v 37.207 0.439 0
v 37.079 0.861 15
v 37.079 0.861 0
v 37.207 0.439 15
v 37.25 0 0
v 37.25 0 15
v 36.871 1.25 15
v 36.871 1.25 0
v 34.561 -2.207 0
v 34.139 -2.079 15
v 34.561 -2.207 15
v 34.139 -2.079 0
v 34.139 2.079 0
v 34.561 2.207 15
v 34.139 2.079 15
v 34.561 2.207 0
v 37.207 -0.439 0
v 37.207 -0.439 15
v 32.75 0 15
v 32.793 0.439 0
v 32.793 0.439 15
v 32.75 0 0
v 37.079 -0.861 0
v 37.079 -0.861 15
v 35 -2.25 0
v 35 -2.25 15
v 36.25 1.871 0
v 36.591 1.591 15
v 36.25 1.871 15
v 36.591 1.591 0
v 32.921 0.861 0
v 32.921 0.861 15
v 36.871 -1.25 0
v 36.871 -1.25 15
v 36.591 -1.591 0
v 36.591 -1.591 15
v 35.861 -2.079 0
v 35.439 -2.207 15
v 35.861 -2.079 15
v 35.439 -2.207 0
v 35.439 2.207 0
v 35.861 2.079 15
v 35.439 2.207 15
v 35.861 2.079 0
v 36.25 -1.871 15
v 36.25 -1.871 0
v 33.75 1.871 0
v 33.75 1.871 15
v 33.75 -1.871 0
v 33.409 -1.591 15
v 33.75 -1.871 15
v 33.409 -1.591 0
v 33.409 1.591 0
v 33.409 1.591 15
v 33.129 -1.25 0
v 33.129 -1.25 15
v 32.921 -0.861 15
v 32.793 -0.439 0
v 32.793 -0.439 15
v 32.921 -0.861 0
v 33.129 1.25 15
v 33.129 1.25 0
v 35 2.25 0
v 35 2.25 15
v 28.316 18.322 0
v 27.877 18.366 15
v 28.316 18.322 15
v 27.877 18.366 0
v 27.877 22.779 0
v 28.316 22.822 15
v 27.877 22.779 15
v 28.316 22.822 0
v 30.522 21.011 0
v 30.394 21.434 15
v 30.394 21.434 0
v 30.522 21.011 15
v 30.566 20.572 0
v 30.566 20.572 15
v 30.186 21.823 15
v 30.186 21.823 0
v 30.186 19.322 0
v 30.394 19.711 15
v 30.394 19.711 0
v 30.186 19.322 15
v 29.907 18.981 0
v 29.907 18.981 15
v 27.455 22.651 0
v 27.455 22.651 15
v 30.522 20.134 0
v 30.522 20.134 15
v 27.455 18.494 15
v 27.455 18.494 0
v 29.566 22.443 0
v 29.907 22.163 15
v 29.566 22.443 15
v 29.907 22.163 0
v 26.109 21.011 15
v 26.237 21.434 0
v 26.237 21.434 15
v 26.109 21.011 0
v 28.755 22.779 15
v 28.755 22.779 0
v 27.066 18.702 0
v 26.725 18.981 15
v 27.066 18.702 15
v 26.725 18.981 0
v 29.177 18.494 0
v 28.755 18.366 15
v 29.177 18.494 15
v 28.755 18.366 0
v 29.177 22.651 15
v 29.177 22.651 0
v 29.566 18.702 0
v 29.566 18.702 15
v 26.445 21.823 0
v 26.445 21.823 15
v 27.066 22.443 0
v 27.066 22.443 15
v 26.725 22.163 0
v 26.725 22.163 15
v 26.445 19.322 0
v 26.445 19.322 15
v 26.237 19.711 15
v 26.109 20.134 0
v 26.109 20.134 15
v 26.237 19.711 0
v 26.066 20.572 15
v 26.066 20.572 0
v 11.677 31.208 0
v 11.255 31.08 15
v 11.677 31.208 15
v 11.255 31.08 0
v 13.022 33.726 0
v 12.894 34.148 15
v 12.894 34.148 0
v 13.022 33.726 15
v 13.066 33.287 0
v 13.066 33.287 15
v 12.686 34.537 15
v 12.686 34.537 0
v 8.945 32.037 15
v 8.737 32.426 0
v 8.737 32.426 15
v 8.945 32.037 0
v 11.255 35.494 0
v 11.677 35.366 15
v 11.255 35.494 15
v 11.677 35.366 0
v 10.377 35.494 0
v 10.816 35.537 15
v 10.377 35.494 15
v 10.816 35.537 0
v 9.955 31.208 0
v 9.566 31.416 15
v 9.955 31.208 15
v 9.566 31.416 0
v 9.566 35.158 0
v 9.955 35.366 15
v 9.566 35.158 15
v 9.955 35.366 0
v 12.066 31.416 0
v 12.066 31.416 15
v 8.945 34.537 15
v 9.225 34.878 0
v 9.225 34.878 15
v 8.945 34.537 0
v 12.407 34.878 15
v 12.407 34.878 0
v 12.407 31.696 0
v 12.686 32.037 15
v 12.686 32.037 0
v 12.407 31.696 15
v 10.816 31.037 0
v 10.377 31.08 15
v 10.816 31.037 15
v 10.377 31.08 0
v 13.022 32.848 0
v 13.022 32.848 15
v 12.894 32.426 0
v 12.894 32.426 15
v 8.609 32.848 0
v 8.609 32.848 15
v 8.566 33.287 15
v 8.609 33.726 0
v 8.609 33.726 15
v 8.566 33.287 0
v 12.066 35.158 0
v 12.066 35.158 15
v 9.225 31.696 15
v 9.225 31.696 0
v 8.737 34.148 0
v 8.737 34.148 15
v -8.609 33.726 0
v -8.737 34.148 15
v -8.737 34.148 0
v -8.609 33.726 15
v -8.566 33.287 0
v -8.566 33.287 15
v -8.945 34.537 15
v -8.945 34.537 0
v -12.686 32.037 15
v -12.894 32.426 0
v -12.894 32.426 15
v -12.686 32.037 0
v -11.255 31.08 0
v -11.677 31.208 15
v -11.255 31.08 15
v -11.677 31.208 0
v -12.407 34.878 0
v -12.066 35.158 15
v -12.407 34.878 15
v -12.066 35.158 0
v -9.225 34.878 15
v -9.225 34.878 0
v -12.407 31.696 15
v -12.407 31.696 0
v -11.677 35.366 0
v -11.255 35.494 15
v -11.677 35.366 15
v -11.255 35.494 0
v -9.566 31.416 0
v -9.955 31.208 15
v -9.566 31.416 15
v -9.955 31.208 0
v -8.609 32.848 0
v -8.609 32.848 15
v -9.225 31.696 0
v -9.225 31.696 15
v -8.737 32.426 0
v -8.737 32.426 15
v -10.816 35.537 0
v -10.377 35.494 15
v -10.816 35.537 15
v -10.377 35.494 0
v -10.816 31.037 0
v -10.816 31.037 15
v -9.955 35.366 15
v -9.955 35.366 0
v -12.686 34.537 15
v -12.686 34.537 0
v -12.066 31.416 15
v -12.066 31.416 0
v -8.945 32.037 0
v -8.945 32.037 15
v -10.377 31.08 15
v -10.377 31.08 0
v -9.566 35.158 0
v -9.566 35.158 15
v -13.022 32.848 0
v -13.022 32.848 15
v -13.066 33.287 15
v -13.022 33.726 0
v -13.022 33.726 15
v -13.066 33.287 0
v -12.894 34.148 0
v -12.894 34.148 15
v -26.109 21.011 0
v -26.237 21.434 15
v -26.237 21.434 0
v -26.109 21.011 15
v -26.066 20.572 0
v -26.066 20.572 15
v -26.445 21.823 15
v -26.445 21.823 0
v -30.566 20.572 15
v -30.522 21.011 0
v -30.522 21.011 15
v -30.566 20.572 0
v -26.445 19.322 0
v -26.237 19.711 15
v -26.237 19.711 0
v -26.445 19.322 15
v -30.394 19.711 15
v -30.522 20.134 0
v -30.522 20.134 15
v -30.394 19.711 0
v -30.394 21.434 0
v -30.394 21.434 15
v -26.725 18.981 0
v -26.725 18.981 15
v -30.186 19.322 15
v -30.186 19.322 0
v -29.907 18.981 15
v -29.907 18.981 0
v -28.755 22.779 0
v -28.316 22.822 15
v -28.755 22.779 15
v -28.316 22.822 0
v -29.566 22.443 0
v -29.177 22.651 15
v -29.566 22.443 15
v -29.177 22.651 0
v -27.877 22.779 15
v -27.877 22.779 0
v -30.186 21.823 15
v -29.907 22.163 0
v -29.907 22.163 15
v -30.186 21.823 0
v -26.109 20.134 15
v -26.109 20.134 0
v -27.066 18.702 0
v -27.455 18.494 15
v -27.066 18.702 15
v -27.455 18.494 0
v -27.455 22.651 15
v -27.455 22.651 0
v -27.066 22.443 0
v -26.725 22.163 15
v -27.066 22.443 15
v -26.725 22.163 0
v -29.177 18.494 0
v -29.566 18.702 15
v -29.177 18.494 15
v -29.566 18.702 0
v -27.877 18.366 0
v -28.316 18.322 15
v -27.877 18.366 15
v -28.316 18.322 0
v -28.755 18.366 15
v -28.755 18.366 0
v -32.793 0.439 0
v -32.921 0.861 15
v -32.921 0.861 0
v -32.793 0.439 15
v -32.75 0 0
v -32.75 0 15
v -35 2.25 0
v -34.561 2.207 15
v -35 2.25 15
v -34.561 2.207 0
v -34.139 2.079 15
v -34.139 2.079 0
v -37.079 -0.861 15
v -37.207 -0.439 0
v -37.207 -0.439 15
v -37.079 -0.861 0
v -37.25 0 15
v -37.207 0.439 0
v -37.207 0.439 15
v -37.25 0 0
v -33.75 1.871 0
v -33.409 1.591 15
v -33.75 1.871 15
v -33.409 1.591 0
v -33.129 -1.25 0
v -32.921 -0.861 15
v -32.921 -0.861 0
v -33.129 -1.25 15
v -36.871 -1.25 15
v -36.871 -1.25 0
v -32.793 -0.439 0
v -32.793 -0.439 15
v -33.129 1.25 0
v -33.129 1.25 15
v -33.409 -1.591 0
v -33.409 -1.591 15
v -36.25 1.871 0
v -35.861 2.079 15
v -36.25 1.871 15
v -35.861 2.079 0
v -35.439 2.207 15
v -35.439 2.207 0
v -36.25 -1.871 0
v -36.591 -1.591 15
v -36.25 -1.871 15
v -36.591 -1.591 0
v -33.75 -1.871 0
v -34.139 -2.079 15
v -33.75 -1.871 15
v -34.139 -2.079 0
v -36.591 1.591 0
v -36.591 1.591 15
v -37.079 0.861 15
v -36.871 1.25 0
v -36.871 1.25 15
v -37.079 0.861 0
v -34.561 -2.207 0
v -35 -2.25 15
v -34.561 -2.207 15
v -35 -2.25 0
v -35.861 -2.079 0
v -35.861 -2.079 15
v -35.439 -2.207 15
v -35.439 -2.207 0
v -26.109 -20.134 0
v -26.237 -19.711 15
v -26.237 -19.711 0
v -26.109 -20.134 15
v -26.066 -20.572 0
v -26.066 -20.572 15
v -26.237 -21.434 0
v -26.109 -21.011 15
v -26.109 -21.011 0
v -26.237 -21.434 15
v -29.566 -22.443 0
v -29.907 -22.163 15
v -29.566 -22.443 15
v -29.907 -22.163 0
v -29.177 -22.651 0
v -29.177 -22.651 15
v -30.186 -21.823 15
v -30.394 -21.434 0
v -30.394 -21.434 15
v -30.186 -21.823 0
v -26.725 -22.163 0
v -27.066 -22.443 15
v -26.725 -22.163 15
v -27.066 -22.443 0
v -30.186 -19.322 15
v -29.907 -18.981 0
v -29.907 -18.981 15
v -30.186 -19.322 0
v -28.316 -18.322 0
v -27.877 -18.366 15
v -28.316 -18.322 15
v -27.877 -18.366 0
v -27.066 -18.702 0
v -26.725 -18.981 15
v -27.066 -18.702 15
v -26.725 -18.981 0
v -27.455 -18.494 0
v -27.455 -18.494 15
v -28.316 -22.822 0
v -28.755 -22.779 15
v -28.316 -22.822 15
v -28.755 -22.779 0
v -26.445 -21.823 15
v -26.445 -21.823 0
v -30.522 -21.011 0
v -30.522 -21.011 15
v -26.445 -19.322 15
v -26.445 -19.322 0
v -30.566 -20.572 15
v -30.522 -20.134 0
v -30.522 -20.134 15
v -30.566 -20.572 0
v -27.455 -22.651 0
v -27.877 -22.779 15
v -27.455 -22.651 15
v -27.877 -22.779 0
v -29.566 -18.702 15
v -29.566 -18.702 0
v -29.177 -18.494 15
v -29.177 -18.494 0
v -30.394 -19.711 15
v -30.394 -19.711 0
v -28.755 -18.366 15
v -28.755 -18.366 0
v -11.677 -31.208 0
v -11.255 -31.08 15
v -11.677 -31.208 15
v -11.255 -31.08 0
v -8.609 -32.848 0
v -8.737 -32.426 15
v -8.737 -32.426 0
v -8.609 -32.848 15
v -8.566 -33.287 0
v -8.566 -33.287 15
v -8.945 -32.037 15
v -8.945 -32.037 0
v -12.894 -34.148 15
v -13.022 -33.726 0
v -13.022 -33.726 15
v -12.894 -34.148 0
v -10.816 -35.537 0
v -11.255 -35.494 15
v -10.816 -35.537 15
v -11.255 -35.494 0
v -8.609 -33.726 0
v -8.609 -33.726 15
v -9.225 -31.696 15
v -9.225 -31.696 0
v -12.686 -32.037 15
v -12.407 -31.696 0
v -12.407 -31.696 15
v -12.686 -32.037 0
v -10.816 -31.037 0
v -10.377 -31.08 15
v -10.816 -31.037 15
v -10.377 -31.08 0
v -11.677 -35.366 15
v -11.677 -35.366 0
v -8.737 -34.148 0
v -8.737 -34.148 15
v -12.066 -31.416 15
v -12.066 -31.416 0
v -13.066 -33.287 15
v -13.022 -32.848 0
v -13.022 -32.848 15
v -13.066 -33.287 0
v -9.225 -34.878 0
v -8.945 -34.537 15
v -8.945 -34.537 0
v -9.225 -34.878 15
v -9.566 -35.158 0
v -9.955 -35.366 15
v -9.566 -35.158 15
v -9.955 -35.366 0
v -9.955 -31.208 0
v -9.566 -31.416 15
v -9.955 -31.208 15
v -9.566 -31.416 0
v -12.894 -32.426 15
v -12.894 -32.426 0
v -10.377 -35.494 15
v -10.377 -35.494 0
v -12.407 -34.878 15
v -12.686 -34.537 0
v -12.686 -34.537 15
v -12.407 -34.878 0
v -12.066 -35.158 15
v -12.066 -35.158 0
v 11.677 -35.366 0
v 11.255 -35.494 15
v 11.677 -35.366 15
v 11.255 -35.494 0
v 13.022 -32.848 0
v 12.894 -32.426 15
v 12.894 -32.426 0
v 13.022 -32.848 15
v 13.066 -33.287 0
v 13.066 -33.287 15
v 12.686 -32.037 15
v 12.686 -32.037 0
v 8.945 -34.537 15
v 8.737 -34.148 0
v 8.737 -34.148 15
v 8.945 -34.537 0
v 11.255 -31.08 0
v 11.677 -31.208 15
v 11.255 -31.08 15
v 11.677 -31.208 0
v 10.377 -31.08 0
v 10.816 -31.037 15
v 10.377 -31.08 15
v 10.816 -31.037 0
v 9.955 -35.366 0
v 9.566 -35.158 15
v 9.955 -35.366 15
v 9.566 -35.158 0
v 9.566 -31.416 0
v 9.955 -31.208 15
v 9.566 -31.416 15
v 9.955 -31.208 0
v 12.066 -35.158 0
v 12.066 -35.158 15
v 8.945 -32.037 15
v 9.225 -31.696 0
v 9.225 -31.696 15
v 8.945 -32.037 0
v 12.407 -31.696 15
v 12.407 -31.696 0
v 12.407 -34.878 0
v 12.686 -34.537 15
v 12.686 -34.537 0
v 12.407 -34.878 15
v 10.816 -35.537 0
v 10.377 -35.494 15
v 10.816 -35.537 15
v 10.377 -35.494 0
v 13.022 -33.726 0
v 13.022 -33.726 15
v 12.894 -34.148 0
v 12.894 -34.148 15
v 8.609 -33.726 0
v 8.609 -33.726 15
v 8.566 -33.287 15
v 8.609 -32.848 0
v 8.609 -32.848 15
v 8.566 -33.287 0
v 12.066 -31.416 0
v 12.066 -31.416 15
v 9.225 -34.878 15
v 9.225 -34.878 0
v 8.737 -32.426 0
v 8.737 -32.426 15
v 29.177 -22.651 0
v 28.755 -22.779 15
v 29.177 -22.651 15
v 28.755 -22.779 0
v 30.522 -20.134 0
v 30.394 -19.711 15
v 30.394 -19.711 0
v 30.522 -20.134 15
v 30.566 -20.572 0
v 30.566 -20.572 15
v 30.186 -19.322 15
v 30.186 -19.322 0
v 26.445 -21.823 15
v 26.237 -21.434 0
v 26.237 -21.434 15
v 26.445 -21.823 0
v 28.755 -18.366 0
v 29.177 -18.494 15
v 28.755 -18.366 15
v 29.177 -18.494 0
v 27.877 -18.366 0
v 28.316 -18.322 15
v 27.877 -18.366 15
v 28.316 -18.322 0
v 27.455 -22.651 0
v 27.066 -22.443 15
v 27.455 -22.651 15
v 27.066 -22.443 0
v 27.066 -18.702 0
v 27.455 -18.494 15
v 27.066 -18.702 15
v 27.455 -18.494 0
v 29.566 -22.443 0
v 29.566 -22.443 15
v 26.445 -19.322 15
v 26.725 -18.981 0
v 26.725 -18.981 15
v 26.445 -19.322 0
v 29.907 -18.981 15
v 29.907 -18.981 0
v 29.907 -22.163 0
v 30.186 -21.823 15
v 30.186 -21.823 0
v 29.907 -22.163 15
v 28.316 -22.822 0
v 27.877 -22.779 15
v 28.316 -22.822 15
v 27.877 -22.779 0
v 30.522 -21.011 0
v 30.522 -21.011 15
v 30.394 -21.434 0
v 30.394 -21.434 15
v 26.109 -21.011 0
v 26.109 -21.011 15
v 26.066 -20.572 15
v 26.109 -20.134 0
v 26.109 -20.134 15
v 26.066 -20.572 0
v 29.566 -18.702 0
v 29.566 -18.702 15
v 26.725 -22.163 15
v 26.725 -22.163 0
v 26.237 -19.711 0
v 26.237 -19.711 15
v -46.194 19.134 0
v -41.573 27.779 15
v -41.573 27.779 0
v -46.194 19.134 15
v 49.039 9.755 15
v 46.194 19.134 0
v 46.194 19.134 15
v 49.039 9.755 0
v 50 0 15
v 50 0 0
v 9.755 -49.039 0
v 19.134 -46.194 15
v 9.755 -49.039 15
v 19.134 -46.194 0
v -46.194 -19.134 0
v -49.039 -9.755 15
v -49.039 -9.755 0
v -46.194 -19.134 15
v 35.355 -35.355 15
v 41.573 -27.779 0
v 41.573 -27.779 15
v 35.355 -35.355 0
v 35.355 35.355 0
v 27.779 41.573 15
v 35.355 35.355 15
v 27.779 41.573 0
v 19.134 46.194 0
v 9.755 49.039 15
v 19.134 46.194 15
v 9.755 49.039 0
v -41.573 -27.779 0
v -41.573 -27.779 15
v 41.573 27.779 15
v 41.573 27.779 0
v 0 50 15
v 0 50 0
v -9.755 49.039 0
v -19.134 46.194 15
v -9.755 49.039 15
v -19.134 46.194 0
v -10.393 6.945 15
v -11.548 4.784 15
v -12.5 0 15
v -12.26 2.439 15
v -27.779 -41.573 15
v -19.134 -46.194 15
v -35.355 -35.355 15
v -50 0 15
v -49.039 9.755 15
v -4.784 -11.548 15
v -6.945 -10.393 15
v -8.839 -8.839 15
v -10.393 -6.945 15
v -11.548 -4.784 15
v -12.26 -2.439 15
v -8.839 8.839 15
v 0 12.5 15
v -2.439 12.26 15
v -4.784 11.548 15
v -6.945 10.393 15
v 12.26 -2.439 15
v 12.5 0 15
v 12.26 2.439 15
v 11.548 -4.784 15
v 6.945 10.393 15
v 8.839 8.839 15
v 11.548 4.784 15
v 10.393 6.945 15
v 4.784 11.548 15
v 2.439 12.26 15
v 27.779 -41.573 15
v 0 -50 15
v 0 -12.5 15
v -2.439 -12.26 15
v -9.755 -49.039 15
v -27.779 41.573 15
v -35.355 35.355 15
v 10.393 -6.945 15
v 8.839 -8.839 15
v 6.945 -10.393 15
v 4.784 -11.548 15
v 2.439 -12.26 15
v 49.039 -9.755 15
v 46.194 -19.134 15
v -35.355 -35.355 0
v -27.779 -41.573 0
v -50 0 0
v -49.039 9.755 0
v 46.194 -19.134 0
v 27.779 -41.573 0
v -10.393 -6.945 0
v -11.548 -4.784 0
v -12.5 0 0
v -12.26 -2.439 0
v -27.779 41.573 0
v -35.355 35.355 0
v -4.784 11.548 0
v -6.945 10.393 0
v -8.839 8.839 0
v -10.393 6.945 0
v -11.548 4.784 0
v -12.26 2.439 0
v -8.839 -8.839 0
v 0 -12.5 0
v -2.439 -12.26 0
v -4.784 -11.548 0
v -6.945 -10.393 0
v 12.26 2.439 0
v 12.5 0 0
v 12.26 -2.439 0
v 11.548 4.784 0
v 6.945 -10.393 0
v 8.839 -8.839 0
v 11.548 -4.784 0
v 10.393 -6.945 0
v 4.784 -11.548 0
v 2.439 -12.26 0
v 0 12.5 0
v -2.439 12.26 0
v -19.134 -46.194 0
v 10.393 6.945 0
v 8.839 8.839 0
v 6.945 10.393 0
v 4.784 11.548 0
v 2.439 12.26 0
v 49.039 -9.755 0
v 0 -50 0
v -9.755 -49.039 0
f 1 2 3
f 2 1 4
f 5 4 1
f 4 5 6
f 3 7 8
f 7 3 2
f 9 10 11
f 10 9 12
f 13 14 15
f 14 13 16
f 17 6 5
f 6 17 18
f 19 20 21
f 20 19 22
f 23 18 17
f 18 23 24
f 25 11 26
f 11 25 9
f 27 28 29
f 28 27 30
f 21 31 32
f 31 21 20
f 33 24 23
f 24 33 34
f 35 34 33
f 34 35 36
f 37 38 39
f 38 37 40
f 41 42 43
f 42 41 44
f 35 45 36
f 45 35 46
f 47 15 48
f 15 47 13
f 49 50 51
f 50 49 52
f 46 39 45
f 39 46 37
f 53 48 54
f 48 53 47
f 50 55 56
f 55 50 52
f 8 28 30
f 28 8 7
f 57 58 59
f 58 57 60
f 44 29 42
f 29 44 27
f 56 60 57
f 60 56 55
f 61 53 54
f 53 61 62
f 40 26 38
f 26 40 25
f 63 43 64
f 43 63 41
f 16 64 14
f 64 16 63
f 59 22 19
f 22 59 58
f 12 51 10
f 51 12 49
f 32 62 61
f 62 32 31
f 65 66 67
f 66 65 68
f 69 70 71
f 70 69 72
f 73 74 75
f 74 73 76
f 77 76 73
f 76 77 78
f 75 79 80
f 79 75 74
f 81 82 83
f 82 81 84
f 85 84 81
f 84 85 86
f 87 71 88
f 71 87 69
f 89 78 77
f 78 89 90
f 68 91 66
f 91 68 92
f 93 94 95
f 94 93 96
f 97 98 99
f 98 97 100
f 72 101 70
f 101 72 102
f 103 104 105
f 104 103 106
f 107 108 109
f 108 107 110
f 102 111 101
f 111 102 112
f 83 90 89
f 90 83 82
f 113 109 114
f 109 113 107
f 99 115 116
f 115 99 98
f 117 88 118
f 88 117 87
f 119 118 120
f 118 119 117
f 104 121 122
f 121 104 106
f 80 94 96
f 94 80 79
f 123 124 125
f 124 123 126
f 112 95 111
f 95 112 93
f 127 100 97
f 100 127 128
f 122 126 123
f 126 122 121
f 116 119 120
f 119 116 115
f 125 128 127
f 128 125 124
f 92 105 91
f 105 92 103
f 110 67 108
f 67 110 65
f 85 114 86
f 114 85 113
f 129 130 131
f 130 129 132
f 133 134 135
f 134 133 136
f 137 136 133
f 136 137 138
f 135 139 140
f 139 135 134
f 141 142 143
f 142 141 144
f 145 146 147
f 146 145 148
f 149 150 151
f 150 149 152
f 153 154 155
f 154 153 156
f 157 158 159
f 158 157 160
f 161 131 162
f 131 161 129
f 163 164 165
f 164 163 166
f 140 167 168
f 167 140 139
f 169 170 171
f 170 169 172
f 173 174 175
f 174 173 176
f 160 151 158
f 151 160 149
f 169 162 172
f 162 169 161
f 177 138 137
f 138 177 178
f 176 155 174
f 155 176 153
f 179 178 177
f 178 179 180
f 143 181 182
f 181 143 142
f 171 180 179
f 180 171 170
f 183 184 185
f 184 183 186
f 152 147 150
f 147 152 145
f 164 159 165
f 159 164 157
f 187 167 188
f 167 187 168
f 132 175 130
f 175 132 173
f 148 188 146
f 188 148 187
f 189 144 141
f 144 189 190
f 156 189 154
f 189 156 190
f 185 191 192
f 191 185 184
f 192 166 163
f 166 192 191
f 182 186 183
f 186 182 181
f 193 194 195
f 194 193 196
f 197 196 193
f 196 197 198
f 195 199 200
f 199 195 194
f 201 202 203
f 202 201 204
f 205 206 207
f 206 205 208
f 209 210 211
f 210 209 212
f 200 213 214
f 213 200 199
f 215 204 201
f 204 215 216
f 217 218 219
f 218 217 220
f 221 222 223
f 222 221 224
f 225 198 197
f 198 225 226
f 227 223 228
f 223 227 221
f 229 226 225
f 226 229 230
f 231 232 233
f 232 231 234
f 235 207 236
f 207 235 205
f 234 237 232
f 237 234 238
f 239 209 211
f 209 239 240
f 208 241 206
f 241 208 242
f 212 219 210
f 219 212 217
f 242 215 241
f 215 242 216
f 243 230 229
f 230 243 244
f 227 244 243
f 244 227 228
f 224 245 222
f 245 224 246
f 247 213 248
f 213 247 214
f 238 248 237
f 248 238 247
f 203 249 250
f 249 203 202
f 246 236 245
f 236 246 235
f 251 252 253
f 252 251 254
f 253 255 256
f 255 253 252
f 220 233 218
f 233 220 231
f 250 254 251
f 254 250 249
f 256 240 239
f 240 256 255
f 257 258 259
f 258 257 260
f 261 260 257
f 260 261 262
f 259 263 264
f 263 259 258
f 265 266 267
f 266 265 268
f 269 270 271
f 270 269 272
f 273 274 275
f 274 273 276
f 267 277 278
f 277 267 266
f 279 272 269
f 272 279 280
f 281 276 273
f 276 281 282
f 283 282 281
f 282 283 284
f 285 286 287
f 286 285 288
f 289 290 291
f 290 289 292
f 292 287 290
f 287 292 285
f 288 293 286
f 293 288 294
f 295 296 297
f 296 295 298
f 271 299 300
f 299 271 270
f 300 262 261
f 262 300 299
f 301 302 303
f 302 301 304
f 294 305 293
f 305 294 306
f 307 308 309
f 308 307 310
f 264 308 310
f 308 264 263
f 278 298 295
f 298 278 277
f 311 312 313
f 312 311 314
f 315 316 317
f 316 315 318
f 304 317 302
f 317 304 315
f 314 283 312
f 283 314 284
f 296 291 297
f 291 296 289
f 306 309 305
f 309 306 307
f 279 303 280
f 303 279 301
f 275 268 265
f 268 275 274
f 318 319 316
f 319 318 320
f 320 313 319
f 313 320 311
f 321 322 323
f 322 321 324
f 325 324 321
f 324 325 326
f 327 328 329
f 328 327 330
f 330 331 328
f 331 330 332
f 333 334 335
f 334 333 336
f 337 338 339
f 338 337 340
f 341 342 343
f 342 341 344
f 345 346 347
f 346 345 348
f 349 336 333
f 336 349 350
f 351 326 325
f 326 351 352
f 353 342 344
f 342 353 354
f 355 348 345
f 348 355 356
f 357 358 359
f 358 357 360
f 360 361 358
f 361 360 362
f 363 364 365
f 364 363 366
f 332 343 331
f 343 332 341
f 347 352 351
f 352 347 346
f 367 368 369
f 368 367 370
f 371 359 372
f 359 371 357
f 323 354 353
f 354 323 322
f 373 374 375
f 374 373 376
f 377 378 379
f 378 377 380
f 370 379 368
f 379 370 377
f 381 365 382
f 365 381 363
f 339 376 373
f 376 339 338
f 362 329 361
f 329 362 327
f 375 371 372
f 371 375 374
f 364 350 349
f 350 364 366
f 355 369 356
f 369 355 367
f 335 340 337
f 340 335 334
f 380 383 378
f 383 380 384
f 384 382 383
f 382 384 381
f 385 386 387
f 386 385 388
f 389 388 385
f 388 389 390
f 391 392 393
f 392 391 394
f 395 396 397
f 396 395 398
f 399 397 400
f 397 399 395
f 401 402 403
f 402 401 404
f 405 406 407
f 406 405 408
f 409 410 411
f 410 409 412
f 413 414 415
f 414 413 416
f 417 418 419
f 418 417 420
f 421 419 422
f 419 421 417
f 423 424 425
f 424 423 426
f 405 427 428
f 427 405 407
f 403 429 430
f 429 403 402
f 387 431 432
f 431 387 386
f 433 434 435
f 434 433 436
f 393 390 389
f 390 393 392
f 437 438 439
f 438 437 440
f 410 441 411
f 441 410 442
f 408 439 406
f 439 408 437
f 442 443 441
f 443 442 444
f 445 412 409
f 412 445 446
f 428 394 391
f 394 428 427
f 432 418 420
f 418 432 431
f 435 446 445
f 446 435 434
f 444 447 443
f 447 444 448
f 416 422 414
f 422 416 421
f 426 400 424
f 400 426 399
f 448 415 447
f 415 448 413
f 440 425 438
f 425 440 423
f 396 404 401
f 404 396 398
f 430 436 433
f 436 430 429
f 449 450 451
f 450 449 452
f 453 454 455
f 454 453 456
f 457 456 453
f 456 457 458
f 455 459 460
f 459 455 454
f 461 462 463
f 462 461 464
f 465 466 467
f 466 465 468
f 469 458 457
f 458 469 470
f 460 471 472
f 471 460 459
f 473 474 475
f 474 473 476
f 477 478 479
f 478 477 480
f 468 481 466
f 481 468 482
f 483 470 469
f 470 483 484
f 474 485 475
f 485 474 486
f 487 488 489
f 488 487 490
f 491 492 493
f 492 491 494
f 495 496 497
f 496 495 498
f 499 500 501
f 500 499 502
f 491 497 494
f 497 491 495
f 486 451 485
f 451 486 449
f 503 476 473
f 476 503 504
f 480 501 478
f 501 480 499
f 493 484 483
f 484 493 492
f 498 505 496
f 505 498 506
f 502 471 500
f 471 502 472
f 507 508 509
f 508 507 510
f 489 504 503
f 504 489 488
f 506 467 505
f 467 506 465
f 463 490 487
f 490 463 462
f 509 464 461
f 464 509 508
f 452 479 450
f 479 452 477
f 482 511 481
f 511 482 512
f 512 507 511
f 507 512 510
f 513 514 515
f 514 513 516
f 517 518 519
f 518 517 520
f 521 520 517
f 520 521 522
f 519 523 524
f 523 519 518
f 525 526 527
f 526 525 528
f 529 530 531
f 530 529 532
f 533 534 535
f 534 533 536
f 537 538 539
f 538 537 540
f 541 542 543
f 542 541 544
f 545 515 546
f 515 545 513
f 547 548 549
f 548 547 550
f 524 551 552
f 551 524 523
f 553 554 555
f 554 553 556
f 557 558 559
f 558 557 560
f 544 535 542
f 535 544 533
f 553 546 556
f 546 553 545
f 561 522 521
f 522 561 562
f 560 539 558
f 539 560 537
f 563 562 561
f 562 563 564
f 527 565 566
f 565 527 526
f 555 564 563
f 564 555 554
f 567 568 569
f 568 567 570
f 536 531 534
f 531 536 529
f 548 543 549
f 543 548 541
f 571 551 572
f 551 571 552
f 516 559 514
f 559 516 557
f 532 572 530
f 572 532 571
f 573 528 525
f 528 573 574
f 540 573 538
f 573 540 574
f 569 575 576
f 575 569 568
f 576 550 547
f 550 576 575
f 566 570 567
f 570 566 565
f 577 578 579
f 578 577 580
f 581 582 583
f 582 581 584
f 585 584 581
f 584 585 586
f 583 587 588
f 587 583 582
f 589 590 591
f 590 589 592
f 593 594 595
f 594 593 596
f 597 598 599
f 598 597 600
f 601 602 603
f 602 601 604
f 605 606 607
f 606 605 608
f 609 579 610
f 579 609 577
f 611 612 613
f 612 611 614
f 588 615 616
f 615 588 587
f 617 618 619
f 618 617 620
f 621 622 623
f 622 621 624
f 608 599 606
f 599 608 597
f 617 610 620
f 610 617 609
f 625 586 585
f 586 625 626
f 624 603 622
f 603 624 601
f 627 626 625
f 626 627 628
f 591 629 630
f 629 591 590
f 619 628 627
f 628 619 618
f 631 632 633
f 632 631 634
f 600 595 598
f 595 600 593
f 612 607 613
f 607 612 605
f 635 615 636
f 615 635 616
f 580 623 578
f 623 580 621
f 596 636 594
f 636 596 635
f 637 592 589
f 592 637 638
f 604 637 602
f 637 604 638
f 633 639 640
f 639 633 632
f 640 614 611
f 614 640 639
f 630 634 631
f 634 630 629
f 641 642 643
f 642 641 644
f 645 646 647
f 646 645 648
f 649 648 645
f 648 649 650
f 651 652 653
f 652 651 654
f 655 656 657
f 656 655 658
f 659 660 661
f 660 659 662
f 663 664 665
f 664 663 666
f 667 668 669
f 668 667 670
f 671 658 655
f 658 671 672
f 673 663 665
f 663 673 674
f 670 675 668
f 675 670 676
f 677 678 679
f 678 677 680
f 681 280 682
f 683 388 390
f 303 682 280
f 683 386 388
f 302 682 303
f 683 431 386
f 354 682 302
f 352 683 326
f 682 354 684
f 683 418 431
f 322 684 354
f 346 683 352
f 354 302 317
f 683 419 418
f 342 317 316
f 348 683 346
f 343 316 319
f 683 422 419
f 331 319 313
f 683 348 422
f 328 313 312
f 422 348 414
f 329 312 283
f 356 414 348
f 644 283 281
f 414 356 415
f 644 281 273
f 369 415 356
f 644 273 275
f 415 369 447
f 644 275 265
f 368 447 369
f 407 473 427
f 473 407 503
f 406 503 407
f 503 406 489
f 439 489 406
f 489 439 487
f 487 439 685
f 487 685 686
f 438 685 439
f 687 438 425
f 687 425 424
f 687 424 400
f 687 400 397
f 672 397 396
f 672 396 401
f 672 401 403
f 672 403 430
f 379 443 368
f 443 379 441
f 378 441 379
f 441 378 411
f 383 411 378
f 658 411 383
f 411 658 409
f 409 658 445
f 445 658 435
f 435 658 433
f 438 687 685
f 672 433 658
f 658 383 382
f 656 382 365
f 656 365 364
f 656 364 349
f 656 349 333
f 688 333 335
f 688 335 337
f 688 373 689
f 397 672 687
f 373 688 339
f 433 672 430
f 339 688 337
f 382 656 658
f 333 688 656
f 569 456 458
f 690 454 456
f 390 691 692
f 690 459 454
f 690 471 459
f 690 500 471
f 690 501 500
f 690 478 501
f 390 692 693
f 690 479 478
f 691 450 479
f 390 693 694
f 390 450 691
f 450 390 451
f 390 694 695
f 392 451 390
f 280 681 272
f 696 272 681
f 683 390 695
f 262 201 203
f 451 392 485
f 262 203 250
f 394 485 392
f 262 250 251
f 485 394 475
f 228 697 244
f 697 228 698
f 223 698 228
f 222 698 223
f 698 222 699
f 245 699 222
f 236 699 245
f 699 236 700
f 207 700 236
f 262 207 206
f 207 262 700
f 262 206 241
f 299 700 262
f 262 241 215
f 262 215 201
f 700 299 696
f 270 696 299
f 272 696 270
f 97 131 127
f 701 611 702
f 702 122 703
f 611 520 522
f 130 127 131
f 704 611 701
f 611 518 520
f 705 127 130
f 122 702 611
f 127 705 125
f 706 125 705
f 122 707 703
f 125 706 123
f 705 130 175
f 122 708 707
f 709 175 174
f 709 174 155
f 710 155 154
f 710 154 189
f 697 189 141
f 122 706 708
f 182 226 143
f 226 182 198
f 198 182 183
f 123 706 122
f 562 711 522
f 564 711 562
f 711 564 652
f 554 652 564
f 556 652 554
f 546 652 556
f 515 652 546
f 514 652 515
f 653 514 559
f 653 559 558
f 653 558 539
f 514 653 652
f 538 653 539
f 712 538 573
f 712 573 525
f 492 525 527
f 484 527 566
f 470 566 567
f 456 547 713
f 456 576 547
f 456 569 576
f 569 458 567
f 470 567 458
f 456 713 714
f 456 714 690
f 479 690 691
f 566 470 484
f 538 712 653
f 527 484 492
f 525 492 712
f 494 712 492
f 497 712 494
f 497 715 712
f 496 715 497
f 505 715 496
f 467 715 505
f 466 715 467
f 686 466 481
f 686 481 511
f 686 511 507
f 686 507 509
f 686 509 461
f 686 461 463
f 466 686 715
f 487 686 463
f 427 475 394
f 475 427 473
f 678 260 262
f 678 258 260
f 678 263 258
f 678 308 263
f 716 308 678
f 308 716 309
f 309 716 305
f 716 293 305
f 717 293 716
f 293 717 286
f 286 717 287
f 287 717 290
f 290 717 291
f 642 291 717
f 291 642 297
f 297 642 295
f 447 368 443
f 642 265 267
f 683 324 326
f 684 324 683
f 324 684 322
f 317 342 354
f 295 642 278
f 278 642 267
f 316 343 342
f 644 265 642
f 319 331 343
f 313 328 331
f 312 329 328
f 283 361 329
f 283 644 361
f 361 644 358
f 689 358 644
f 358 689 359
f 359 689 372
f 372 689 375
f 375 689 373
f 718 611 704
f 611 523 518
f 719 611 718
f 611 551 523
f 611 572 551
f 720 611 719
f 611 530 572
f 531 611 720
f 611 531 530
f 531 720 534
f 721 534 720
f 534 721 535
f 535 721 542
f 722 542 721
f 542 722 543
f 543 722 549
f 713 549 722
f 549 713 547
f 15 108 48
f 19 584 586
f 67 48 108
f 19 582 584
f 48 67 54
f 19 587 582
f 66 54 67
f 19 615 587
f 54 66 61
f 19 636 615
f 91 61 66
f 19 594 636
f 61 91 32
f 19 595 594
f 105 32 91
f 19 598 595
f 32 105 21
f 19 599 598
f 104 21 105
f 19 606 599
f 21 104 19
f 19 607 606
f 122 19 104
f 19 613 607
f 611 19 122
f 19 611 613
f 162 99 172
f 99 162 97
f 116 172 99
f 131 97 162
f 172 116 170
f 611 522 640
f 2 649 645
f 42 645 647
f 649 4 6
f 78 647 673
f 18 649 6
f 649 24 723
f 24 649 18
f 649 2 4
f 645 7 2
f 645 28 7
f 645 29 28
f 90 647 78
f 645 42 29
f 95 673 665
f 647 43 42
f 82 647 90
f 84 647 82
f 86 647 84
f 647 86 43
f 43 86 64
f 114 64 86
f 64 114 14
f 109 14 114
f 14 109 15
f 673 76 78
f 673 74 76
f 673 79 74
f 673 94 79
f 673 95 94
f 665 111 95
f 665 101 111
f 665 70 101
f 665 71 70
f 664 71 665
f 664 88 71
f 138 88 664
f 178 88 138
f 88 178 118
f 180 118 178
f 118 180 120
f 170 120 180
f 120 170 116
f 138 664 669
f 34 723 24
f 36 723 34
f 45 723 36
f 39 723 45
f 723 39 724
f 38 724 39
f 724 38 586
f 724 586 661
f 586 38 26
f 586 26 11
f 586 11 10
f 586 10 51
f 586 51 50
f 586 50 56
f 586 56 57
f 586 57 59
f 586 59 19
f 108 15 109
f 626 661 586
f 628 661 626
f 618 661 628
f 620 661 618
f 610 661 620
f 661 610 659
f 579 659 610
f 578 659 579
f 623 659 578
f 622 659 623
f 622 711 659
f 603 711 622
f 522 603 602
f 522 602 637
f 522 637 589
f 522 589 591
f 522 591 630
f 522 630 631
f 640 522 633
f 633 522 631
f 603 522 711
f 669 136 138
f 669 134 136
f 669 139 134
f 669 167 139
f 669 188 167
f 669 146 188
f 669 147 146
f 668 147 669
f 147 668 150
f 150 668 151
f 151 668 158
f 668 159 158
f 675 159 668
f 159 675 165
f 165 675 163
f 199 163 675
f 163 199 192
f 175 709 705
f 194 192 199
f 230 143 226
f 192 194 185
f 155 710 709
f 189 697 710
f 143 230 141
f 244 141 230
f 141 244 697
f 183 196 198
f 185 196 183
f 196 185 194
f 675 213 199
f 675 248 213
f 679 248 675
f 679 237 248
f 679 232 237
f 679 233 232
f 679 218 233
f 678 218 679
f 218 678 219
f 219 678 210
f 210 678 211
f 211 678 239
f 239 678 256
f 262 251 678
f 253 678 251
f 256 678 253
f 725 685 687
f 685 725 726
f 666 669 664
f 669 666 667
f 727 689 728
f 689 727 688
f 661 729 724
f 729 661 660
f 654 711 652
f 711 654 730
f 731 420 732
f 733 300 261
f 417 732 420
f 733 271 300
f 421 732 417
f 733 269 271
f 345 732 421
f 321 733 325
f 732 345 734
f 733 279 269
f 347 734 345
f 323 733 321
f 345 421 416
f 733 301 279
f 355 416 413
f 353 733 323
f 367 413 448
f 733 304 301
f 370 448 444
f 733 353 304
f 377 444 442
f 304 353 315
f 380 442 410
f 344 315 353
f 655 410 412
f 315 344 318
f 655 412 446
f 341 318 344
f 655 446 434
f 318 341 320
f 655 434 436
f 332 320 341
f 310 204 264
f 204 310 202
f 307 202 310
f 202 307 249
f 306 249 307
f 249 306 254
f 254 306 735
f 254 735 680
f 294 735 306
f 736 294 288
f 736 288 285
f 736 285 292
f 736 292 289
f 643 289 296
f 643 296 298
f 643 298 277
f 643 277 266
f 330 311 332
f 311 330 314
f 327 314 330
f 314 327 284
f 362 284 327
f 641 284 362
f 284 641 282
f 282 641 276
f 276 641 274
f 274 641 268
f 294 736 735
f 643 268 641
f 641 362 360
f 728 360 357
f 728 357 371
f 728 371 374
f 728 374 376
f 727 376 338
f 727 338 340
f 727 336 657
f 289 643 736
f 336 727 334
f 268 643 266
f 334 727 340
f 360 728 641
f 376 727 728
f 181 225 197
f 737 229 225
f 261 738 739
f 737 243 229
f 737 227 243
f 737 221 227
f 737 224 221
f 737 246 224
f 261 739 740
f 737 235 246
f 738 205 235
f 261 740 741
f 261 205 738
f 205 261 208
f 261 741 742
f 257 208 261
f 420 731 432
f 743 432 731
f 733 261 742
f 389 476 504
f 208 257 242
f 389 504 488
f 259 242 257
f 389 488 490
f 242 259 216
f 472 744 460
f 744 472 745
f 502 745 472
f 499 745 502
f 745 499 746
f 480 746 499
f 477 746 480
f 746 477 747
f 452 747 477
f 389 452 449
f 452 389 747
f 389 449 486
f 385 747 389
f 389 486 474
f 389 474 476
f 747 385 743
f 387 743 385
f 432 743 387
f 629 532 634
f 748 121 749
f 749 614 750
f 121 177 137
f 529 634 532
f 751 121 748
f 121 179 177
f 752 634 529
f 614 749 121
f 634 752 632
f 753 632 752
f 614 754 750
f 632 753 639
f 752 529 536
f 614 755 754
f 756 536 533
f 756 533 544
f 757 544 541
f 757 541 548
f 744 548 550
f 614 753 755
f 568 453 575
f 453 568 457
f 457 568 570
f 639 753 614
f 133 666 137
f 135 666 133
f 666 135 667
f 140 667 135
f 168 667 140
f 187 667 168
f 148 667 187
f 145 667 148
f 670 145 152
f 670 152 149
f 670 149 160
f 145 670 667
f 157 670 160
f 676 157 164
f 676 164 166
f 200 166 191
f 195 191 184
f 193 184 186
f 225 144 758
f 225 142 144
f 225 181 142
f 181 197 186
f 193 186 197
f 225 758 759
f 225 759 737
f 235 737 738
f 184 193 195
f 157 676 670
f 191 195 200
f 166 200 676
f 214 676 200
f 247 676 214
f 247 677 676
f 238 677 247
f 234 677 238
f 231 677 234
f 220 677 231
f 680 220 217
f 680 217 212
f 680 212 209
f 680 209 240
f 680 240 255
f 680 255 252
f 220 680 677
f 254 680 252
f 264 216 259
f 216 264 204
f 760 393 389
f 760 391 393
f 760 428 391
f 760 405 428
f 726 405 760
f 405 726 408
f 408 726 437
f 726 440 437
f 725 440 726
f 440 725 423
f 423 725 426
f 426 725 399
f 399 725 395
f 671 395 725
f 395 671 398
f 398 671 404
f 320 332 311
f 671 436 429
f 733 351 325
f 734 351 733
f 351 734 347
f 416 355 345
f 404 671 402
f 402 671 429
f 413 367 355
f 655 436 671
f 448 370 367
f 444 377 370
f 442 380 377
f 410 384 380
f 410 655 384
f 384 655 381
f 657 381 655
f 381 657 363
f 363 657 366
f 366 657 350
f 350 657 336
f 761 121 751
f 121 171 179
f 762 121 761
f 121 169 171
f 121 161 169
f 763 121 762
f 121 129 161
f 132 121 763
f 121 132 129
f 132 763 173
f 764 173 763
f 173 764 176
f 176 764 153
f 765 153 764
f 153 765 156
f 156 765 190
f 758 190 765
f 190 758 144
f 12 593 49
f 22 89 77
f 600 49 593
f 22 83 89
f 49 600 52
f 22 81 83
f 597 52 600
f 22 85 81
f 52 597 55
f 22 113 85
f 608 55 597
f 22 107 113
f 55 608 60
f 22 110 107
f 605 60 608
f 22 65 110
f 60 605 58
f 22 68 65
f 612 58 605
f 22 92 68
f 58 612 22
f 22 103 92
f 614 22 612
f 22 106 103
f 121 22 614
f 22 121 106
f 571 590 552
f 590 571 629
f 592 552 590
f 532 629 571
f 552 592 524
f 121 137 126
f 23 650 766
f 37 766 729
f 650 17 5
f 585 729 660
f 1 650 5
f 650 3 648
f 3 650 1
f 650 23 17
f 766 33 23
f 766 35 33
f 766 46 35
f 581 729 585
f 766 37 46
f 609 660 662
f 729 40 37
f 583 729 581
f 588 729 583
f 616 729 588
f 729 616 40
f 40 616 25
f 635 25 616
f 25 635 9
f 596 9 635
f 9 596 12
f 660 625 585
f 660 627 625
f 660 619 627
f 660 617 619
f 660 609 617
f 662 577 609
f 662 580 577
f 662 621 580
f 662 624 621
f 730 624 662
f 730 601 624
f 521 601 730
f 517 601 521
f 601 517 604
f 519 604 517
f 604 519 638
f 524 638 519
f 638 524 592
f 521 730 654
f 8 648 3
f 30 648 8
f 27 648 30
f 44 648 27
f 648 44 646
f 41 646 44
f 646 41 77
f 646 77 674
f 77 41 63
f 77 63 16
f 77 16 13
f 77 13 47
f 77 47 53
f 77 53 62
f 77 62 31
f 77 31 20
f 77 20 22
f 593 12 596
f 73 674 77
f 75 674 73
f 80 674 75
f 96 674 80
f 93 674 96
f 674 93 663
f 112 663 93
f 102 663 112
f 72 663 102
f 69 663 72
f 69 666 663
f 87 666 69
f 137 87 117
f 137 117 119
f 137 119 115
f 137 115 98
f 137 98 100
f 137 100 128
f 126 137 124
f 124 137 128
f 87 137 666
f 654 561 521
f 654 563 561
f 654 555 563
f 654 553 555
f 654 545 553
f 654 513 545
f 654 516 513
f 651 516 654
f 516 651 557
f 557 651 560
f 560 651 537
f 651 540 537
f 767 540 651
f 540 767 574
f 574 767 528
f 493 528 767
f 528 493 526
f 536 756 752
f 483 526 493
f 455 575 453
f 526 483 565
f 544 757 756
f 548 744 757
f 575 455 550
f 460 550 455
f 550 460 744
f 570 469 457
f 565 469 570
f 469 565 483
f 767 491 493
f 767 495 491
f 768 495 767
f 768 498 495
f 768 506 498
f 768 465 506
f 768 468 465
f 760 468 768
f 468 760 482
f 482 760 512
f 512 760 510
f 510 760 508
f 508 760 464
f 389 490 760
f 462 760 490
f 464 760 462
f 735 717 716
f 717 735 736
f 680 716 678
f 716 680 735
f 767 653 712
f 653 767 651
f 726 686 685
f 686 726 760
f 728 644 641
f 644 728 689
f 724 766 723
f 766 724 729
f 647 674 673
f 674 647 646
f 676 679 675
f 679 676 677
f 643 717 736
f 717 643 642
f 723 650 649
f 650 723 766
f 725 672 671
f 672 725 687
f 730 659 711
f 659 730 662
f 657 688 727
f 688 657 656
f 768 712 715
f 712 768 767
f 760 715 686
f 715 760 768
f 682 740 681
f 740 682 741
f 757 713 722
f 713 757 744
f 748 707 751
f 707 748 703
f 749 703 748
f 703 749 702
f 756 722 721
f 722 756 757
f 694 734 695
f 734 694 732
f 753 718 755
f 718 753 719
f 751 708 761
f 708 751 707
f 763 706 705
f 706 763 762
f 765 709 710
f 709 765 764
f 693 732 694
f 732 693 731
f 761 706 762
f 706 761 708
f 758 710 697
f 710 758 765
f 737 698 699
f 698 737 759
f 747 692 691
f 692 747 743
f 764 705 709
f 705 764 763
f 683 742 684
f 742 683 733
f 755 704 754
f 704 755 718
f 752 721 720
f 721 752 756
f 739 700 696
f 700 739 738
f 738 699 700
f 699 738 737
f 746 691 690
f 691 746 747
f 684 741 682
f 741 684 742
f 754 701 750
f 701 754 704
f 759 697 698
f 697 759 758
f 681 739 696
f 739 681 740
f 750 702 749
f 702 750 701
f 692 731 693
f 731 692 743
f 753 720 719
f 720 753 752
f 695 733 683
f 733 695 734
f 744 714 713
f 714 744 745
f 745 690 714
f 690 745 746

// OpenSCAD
$fn = 32;

// ----------------------------------------------------------------------
// Flange Ø100 x 15
// 10 holes on a Ø70 bolt circle, bolted joints
// ----------------------------------------------------------------------

// --- parameters (mm) ---
flange_d = 100;  // outside diameter of the flange
thickness = 15;  // flange thickness
holes = 10;      // number of bolt holes
pcd = 70;        // bolt circle diameter
start_deg = 0;   // angle of the first hole, from +X
hole_d = 4.5;    // bolt hole diameter
bore_d = 25;     // central through bore
hub_d = 35;      // hub outside diameter
hub_h = 0;       // hub height above the flange face (0 = no hub)

// --- derived feature positions (mm) ---
height = thickness + hub_h;  // = 15   overall height of the part
pcd_r = pcd / 2;             // = 35   bolt circle radius
hole_step = 360 / holes;     // = 36   angular pitch
feature_centers = [
  [pcd_r * cos(start_deg + 0 * hole_step), pcd_r * sin(start_deg + 0 * hole_step)],
  [pcd_r * cos(start_deg + 1 * hole_step), pcd_r * sin(start_deg + 1 * hole_step)],
  [pcd_r * cos(start_deg + 2 * hole_step), pcd_r * sin(start_deg + 2 * hole_step)],
  [pcd_r * cos(start_deg + 3 * hole_step), pcd_r * sin(start_deg + 3 * hole_step)],
  [pcd_r * cos(start_deg + 4 * hole_step), pcd_r * sin(start_deg + 4 * hole_step)],
  [pcd_r * cos(start_deg + 5 * hole_step), pcd_r * sin(start_deg + 5 * hole_step)],
  [pcd_r * cos(start_deg + 6 * hole_step), pcd_r * sin(start_deg + 6 * hole_step)],
  [pcd_r * cos(start_deg + 7 * hole_step), pcd_r * sin(start_deg + 7 * hole_step)],
  [pcd_r * cos(start_deg + 8 * hole_step), pcd_r * sin(start_deg + 8 * hole_step)],
  [pcd_r * cos(start_deg + 9 * hole_step), pcd_r * sin(start_deg + 9 * hole_step)]
];   // bolt hole centres on the pitch circle

// flange disc, every hole and the bore cut straight through
difference() {
  union() {
    cylinder(d = flange_d, h = thickness);
  }
  translate([0, 0, -1]) cylinder(d = bore_d, h = height + 2);  // bore, through
  for (centre = feature_centers)
    translate([centre[0], centre[1], -1]) cylinder(d = hole_d, h = thickness + 2);
}
